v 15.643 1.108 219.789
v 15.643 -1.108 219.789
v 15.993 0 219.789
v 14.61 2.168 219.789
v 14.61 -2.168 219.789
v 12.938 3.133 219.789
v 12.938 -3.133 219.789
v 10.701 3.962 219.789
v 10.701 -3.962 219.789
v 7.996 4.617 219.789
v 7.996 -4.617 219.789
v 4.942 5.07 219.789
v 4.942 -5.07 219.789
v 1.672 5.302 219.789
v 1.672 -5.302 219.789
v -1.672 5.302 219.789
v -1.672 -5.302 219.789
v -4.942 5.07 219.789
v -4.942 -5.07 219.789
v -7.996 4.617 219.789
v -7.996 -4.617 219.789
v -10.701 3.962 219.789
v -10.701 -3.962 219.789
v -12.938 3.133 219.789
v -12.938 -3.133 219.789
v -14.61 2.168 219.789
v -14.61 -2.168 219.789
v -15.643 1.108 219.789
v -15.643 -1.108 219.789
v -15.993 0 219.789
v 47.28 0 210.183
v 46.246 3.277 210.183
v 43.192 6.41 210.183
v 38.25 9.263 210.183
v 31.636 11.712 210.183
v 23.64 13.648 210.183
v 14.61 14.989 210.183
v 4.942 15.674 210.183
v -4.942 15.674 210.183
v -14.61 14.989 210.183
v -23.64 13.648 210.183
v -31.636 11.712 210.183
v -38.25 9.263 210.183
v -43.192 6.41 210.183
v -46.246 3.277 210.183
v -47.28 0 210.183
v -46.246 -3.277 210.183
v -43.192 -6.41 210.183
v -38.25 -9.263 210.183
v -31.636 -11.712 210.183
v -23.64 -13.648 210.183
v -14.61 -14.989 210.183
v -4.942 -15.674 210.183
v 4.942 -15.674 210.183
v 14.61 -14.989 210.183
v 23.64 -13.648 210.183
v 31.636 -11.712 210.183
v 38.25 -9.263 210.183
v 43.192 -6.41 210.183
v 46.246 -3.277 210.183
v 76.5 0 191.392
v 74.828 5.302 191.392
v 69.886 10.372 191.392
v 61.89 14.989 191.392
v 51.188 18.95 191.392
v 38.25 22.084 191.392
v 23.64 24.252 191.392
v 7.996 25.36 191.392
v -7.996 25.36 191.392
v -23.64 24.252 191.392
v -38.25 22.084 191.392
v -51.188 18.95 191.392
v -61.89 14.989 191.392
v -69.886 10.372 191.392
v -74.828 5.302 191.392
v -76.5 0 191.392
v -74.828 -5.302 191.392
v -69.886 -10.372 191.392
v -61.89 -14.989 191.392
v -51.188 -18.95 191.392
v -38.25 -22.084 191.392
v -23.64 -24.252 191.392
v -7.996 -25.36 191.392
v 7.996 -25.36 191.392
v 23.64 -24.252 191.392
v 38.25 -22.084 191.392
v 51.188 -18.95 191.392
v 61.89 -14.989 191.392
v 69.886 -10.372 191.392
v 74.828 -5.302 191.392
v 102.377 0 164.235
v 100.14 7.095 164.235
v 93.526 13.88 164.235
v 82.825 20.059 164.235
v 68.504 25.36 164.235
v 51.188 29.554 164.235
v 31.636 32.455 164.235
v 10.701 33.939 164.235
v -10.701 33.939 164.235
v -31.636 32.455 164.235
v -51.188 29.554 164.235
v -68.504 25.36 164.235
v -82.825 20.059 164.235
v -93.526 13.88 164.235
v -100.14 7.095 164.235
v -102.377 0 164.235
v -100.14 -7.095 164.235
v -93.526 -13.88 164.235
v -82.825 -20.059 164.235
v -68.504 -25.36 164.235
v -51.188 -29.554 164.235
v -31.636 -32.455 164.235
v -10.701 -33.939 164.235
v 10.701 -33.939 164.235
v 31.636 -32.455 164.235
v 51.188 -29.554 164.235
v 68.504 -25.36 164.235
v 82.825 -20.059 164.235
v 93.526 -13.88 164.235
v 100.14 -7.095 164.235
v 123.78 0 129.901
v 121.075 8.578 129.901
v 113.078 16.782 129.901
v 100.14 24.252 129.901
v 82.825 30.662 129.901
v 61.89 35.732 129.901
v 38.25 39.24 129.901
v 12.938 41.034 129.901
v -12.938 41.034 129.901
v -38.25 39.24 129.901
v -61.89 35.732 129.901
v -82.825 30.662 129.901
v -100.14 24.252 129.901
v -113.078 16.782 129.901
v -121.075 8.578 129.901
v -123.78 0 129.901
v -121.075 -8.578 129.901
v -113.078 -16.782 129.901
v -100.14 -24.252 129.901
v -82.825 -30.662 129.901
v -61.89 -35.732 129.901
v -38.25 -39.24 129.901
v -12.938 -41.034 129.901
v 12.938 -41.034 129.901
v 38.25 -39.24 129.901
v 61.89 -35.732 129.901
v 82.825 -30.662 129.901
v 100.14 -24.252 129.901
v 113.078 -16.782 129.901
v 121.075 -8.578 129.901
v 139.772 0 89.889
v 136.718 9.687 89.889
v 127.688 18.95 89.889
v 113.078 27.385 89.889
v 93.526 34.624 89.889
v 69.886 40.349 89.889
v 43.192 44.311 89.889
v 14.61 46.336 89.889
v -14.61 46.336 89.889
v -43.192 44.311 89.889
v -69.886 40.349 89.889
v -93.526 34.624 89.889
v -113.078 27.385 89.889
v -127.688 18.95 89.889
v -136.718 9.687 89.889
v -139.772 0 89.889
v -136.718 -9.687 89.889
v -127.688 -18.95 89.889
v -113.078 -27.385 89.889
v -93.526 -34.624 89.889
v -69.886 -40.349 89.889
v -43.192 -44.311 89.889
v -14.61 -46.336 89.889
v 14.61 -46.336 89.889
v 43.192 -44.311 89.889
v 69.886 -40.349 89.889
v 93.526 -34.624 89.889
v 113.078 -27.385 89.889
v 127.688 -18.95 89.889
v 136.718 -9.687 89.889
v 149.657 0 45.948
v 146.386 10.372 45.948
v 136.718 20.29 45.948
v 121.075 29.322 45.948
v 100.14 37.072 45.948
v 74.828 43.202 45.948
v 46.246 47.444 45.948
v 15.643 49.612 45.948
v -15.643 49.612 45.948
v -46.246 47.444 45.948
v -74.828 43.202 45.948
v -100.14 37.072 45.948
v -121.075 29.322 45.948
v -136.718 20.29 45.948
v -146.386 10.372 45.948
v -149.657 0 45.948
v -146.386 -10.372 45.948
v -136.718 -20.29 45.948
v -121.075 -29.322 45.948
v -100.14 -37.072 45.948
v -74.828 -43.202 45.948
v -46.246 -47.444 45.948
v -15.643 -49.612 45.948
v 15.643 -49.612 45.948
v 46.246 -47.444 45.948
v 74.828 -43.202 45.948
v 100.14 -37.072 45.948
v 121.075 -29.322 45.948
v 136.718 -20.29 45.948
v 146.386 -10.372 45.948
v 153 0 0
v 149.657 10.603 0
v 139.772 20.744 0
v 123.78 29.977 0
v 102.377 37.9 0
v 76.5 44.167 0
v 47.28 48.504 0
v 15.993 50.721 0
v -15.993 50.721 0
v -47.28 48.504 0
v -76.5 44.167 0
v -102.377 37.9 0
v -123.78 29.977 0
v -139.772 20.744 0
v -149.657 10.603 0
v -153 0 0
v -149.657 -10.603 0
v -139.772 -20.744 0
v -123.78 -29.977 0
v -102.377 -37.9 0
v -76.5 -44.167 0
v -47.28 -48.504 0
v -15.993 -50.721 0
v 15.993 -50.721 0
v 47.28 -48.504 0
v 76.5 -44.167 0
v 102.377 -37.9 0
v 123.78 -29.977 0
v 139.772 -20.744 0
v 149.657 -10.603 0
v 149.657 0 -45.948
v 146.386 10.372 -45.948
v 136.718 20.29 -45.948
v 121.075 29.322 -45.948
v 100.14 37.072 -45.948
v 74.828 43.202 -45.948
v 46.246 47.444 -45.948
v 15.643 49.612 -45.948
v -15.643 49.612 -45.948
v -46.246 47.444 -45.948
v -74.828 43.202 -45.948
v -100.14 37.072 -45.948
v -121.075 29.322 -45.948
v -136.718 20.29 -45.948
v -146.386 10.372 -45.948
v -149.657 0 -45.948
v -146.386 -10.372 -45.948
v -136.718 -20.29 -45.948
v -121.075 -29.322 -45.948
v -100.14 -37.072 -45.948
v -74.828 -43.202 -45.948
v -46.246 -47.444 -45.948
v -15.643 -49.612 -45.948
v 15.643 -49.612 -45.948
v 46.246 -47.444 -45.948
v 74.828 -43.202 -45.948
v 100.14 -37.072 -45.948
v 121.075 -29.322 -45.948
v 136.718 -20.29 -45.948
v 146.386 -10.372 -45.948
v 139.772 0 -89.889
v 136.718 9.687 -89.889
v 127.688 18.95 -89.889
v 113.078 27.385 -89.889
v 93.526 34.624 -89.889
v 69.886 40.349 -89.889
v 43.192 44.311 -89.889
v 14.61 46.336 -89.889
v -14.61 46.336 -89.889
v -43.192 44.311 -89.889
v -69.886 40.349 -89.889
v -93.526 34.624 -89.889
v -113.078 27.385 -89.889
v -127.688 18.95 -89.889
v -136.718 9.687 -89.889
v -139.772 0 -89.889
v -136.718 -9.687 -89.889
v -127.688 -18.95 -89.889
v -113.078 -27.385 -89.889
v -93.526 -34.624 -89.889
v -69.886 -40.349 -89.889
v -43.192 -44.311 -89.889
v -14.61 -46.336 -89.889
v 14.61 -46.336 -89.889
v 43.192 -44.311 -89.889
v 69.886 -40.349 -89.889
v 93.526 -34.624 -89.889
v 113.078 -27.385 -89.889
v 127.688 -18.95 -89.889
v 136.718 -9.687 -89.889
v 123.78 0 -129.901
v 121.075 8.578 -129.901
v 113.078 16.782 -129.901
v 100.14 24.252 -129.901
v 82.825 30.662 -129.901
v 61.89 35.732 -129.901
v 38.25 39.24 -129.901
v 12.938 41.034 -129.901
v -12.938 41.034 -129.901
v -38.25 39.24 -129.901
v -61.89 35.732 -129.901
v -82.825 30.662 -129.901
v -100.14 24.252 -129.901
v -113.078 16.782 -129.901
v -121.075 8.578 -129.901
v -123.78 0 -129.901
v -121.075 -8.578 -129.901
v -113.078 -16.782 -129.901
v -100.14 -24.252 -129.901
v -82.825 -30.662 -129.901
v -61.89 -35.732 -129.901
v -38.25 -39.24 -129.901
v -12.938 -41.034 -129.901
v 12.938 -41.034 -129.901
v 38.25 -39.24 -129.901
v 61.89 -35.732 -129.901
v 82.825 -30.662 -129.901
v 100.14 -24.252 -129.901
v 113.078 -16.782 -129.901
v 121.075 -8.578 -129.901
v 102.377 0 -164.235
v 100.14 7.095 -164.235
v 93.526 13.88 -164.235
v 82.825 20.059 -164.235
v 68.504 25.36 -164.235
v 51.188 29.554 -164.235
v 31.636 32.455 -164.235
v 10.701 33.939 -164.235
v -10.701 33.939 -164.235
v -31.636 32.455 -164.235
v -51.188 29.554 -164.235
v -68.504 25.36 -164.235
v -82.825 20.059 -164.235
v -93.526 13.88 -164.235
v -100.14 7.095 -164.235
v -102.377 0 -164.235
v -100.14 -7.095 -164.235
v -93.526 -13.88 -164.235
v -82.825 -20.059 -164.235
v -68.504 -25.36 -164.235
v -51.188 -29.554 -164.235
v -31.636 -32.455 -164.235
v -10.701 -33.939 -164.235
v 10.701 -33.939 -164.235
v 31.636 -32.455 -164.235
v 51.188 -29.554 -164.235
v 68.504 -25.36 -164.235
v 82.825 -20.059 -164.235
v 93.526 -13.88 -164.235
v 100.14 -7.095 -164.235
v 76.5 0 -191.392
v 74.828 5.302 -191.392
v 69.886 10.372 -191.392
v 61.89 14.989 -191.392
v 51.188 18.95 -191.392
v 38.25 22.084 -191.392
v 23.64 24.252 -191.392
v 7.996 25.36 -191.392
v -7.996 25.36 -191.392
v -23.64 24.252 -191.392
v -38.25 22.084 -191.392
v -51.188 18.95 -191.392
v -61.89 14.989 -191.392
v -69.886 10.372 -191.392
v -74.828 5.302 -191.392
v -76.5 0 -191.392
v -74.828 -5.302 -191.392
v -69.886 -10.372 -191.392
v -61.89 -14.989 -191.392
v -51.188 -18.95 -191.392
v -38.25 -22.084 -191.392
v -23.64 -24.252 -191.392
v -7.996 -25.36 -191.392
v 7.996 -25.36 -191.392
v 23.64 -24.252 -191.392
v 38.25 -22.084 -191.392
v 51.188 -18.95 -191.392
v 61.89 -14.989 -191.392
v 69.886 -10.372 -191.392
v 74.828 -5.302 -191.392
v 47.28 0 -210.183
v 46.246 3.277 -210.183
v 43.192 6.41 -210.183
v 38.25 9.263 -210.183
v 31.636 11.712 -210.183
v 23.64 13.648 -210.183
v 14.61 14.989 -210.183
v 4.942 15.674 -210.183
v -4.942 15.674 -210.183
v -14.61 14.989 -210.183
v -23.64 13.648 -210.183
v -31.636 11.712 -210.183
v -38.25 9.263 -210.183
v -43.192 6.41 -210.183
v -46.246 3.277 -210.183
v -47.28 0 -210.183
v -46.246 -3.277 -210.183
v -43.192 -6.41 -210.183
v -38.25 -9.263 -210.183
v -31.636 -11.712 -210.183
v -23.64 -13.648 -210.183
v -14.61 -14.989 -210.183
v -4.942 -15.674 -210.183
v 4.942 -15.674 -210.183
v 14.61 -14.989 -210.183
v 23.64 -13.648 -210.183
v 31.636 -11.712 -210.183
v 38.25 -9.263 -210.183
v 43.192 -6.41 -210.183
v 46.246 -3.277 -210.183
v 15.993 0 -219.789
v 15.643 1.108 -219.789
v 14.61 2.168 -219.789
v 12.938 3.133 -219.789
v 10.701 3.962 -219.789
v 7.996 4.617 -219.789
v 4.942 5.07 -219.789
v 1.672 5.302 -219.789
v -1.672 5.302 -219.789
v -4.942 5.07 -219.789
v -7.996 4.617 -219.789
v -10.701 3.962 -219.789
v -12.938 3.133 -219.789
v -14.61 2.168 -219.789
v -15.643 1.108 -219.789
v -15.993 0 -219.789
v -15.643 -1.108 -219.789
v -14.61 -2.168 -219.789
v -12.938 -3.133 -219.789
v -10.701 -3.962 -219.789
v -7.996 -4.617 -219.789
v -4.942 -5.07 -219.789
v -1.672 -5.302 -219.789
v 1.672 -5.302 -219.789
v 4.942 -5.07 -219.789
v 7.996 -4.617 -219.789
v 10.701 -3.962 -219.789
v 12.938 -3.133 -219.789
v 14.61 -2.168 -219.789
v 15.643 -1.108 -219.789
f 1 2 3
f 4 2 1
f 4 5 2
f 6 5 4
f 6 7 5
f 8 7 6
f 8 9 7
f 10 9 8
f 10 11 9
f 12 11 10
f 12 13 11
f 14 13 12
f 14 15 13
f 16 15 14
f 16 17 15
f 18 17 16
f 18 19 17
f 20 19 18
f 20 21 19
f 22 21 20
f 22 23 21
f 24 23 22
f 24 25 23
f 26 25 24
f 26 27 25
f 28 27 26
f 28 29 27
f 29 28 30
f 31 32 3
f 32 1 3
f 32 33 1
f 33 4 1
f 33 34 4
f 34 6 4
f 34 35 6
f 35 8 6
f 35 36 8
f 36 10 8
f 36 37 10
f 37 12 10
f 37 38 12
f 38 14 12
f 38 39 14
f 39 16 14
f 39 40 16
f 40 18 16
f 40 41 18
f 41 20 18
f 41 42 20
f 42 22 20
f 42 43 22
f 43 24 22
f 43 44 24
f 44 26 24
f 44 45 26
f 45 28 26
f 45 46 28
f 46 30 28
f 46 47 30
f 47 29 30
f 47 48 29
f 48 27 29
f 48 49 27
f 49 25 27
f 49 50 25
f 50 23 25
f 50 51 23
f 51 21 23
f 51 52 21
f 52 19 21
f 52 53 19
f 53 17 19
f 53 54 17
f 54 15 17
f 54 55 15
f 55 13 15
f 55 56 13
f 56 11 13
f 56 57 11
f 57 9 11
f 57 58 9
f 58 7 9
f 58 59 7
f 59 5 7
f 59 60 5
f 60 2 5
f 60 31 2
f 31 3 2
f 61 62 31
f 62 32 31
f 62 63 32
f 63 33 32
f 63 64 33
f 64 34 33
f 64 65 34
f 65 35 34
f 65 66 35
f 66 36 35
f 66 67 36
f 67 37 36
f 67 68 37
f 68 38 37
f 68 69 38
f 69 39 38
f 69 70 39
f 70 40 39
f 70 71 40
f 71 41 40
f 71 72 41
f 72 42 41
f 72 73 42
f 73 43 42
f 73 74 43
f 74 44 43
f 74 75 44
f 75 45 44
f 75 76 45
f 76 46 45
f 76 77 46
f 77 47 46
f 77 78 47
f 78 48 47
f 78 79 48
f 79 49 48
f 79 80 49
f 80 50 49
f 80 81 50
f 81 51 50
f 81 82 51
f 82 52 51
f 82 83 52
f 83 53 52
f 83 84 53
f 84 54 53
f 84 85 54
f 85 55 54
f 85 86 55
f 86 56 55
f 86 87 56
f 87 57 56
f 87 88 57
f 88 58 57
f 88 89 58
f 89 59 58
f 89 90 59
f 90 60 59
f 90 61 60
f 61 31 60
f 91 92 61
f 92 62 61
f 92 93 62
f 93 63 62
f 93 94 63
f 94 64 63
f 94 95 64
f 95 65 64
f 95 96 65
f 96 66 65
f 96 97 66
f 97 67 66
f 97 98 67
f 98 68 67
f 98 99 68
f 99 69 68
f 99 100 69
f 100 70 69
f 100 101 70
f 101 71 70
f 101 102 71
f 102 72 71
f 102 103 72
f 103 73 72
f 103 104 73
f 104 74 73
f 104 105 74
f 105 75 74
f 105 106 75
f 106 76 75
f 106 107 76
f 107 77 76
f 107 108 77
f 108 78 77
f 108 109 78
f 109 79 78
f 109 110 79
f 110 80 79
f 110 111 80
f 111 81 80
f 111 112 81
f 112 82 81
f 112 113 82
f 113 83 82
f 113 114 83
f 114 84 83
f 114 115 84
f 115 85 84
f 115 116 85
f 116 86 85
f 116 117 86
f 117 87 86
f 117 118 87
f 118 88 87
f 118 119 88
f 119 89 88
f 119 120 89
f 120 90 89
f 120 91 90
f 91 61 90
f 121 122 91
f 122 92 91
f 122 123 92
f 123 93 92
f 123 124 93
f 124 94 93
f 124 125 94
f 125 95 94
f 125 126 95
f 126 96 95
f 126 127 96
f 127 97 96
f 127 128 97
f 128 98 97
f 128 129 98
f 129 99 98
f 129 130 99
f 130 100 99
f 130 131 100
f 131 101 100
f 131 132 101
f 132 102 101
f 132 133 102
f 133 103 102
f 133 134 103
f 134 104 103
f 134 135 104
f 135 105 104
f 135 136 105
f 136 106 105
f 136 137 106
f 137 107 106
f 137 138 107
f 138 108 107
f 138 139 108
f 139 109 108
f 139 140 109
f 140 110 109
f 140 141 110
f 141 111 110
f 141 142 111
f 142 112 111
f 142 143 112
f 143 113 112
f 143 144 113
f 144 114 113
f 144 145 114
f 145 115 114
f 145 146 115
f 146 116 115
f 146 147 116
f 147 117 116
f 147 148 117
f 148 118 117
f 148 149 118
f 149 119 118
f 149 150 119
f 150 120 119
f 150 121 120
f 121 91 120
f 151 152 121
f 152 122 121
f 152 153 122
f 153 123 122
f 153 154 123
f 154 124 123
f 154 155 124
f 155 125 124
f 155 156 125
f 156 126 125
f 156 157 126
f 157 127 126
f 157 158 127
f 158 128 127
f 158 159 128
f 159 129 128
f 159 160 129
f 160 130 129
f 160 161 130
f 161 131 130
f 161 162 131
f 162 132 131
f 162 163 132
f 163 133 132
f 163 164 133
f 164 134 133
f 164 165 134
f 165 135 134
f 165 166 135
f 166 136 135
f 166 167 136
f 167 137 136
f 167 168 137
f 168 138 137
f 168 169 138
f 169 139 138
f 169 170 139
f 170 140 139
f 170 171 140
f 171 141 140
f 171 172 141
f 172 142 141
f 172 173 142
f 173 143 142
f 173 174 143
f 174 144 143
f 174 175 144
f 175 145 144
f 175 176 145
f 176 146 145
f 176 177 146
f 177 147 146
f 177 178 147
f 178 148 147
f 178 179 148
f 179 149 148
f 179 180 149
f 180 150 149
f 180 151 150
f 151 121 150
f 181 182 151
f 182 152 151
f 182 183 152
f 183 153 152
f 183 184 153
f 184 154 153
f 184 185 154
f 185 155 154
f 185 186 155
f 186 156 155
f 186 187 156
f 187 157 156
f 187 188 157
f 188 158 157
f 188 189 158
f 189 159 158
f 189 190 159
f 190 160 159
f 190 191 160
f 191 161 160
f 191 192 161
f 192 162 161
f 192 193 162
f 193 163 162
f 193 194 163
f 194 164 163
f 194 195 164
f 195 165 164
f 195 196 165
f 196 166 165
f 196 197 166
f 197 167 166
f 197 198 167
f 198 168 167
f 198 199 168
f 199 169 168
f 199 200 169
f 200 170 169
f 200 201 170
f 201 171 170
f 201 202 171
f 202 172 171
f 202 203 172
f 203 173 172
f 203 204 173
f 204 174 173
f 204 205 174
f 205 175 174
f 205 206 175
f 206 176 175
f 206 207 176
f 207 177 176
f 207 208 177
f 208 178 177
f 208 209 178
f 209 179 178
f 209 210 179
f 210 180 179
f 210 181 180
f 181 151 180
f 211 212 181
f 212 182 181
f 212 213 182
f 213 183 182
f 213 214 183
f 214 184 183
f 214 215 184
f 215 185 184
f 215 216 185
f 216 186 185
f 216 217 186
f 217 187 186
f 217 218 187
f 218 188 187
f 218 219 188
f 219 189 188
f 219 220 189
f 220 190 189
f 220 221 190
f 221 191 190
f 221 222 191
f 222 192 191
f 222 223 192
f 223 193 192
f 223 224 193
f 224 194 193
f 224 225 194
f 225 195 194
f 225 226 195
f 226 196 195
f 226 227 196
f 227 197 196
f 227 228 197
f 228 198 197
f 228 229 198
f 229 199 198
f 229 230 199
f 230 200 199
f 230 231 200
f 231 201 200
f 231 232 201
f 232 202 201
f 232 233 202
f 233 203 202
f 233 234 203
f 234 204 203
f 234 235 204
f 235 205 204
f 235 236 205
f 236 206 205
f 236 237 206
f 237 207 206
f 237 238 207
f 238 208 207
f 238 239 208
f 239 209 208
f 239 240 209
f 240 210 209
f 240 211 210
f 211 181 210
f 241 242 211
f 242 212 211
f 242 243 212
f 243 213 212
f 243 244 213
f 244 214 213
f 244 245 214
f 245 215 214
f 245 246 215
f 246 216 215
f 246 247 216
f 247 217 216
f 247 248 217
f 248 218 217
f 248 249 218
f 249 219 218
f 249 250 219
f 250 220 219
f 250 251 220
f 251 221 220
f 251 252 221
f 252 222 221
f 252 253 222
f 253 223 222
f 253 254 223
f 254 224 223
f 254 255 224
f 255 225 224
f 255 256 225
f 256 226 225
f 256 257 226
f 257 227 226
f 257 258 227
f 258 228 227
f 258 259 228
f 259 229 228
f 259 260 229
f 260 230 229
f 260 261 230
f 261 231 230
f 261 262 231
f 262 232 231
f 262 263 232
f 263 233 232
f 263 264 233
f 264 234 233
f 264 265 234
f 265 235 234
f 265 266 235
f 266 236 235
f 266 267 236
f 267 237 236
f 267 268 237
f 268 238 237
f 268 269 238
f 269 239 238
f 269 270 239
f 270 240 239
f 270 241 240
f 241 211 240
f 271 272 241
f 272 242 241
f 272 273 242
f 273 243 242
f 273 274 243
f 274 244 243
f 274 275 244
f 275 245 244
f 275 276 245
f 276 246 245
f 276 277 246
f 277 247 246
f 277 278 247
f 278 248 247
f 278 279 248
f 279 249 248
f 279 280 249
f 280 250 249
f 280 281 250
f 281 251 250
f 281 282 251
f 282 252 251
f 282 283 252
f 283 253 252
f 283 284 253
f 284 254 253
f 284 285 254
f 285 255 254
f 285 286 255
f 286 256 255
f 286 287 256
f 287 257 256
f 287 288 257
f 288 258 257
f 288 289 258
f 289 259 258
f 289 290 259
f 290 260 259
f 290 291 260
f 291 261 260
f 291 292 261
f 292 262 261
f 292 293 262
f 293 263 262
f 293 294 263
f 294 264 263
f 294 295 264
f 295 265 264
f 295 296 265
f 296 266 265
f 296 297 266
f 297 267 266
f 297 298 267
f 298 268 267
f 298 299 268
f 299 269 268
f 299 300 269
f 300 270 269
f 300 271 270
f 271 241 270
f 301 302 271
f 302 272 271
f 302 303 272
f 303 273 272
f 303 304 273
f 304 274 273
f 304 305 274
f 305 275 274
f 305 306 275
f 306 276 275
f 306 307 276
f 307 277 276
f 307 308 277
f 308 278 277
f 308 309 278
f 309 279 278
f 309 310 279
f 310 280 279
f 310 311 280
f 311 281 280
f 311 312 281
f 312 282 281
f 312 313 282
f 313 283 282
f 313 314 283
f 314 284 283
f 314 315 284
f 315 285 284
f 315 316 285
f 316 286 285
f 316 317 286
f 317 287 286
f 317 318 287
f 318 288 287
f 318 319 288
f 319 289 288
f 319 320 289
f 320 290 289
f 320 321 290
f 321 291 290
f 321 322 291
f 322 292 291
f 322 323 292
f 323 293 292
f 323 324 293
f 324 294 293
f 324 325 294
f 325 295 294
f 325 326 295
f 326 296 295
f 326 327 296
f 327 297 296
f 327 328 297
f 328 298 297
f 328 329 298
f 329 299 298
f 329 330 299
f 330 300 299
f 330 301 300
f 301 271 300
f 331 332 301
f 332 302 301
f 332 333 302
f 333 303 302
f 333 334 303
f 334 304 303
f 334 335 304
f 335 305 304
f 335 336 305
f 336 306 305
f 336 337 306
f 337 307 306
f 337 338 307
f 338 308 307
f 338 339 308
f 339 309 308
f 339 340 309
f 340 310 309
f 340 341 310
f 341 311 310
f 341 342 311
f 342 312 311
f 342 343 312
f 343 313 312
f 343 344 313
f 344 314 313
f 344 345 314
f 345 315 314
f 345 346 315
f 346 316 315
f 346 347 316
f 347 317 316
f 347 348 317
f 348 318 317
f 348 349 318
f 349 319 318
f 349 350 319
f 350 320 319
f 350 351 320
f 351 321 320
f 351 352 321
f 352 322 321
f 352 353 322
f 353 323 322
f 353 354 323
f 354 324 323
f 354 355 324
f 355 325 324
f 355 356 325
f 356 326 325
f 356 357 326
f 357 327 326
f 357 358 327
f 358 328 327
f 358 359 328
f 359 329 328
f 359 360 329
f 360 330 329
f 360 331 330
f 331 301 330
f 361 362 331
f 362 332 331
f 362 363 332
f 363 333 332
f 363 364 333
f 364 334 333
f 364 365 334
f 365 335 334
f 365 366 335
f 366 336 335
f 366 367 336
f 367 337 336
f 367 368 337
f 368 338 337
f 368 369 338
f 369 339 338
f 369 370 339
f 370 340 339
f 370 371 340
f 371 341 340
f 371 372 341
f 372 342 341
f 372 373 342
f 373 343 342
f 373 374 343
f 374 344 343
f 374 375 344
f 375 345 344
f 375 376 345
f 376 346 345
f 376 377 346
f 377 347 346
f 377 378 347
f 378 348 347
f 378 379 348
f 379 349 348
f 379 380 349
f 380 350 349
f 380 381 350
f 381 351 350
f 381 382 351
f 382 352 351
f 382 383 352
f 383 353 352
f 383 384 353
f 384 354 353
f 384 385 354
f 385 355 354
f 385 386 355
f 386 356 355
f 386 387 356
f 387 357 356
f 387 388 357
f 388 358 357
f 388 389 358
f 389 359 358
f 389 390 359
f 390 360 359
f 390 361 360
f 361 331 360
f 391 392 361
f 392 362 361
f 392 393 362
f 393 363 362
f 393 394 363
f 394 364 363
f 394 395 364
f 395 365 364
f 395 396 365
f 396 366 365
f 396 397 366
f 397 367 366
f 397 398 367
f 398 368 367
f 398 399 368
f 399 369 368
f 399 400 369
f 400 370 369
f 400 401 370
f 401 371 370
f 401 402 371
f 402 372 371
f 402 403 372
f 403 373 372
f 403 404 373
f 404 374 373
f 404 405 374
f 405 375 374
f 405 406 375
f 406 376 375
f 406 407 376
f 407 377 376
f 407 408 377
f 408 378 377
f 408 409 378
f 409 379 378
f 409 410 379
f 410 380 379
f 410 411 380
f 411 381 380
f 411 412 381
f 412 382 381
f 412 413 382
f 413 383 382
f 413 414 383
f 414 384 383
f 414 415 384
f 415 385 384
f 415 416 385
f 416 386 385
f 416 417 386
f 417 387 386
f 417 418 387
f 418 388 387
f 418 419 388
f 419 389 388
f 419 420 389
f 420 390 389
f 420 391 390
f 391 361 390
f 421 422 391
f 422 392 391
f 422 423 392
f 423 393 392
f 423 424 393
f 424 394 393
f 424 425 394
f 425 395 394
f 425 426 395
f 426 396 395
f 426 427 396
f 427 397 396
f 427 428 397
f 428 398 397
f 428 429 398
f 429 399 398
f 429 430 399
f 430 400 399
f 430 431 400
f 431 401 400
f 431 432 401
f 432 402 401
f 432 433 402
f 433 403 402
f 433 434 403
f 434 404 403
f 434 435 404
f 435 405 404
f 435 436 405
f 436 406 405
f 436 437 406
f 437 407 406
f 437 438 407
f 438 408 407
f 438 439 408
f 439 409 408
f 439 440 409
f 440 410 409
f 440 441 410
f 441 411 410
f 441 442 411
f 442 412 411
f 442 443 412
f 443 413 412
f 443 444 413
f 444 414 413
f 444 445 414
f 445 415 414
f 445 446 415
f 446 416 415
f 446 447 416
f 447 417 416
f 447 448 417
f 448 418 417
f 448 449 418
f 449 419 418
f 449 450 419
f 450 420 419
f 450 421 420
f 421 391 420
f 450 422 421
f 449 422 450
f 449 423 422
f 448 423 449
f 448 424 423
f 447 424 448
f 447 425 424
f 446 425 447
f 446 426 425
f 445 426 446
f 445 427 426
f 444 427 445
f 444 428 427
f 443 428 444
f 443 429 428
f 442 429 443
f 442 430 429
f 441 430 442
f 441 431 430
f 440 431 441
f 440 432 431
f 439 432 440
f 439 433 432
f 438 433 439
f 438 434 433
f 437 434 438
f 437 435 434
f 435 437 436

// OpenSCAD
// Generated by SolidPython 1.0.1 on 2020-07-29 00:46:48


scale(v = [9, 3, 13]) {
	sphere(r = 17);
}
/***********************************************
*********      SolidPython code:      **********
************************************************
 
# import packages: SolidPython
from solid import *
from solid.utils import *
from itertools import chain, combinations, permutations


class Resize:

    def __init__(self, scad_file):
        self.scad_file = scad_file
        #self.scad_file = import_scad(scad_file)
        # cone/cylinder param:
        self.r1 = 0
        self.r2 = 0
        self.h = 0
        # rectangular prism param:
        self.w = 0
        self.l = 0
        # ellipse param:
        self.r = 0

    # import OpenScad code (file name corresponds to shape)


    # classify shape + parameters
    def assign(self, param1, param2, param3):
        if self.scad_file == 'cone.scad':
            self.r1 = param1
            self.r2 = param2
            self.h = param3
        elif self.scad_file == 'cylinder.scad':
            self.r1 = param1
            self.r2 = param2
            self.h = param3
        elif self.scad_file == 'rectangularPrism.scad':
            self.h = param1
            self.l = param2
            self.w = param3
        else:
            self.r = param1
            self.h = param2

    # resize parameters
    def iterate(self):
        x = range(3, 20, 2)
        i = 1
        if self.scad_file == 'cone.scad':
            tempList = list(permutations(x, 2))
            for temp in tempList:
                param1 = temp[0]
                param2 = temp[1]
                filepath = 'produced_scad_files/' + 'cone' + str(param1) + '_' + str(param2) + '_' + '.scad'
                scad_render_to_file(cylinder(h=param1, r1=param2, r2=0), filepath)

        elif self.scad_file == 'cylinder.scad':
            tempList = list(permutations(x, 3))
            for temp in tempList:
                param1 = temp[0]
                param2 = temp[1]
                filepath = 'produced_scad_files/' + 'cylinder' + str(param1) + '_' + str(param2) + '_' + '.scad'
                scad_render_to_file(cylinder(h=param1, r1=param2, r2=param2), filepath)

        elif self.scad_file == 'rectangularPrism.scad':
            tempList = list(permutations(x, 3))
            for temp in tempList:
                param1 = temp[0]
                param2 = temp[1]
                param3 = temp[2]
                filepath = 'produced_scad_files/' + 'rectangularPrism' + str(param1) + '_' + str(param2) + '_' + str(
                    param3) + '.scad'
                scad_render_to_file(cube(size=(param1, param2, param3)), filepath)

        elif self.scad_file == 'ellipse.scad':
            tempList = list(permutations(x, 4))
            for temp in tempList:
                param1 = temp[0]
                param2 = temp[1]
                param3 = temp[2]
                param4 = temp[3]
                filepath = 'produced_scad_files/' + 'ellipse' + str(param1) + '_' + str(param2) + '_' + str(param3) + '_' + str(param4) + '.scad'
                scad_render_to_file(scale([param1, param2, param3])(sphere(r=param4)), filepath)

    def render_to_scadfile(self):
        scad_render_to_file(scad, 'example.scad') 
 
************************************************/
